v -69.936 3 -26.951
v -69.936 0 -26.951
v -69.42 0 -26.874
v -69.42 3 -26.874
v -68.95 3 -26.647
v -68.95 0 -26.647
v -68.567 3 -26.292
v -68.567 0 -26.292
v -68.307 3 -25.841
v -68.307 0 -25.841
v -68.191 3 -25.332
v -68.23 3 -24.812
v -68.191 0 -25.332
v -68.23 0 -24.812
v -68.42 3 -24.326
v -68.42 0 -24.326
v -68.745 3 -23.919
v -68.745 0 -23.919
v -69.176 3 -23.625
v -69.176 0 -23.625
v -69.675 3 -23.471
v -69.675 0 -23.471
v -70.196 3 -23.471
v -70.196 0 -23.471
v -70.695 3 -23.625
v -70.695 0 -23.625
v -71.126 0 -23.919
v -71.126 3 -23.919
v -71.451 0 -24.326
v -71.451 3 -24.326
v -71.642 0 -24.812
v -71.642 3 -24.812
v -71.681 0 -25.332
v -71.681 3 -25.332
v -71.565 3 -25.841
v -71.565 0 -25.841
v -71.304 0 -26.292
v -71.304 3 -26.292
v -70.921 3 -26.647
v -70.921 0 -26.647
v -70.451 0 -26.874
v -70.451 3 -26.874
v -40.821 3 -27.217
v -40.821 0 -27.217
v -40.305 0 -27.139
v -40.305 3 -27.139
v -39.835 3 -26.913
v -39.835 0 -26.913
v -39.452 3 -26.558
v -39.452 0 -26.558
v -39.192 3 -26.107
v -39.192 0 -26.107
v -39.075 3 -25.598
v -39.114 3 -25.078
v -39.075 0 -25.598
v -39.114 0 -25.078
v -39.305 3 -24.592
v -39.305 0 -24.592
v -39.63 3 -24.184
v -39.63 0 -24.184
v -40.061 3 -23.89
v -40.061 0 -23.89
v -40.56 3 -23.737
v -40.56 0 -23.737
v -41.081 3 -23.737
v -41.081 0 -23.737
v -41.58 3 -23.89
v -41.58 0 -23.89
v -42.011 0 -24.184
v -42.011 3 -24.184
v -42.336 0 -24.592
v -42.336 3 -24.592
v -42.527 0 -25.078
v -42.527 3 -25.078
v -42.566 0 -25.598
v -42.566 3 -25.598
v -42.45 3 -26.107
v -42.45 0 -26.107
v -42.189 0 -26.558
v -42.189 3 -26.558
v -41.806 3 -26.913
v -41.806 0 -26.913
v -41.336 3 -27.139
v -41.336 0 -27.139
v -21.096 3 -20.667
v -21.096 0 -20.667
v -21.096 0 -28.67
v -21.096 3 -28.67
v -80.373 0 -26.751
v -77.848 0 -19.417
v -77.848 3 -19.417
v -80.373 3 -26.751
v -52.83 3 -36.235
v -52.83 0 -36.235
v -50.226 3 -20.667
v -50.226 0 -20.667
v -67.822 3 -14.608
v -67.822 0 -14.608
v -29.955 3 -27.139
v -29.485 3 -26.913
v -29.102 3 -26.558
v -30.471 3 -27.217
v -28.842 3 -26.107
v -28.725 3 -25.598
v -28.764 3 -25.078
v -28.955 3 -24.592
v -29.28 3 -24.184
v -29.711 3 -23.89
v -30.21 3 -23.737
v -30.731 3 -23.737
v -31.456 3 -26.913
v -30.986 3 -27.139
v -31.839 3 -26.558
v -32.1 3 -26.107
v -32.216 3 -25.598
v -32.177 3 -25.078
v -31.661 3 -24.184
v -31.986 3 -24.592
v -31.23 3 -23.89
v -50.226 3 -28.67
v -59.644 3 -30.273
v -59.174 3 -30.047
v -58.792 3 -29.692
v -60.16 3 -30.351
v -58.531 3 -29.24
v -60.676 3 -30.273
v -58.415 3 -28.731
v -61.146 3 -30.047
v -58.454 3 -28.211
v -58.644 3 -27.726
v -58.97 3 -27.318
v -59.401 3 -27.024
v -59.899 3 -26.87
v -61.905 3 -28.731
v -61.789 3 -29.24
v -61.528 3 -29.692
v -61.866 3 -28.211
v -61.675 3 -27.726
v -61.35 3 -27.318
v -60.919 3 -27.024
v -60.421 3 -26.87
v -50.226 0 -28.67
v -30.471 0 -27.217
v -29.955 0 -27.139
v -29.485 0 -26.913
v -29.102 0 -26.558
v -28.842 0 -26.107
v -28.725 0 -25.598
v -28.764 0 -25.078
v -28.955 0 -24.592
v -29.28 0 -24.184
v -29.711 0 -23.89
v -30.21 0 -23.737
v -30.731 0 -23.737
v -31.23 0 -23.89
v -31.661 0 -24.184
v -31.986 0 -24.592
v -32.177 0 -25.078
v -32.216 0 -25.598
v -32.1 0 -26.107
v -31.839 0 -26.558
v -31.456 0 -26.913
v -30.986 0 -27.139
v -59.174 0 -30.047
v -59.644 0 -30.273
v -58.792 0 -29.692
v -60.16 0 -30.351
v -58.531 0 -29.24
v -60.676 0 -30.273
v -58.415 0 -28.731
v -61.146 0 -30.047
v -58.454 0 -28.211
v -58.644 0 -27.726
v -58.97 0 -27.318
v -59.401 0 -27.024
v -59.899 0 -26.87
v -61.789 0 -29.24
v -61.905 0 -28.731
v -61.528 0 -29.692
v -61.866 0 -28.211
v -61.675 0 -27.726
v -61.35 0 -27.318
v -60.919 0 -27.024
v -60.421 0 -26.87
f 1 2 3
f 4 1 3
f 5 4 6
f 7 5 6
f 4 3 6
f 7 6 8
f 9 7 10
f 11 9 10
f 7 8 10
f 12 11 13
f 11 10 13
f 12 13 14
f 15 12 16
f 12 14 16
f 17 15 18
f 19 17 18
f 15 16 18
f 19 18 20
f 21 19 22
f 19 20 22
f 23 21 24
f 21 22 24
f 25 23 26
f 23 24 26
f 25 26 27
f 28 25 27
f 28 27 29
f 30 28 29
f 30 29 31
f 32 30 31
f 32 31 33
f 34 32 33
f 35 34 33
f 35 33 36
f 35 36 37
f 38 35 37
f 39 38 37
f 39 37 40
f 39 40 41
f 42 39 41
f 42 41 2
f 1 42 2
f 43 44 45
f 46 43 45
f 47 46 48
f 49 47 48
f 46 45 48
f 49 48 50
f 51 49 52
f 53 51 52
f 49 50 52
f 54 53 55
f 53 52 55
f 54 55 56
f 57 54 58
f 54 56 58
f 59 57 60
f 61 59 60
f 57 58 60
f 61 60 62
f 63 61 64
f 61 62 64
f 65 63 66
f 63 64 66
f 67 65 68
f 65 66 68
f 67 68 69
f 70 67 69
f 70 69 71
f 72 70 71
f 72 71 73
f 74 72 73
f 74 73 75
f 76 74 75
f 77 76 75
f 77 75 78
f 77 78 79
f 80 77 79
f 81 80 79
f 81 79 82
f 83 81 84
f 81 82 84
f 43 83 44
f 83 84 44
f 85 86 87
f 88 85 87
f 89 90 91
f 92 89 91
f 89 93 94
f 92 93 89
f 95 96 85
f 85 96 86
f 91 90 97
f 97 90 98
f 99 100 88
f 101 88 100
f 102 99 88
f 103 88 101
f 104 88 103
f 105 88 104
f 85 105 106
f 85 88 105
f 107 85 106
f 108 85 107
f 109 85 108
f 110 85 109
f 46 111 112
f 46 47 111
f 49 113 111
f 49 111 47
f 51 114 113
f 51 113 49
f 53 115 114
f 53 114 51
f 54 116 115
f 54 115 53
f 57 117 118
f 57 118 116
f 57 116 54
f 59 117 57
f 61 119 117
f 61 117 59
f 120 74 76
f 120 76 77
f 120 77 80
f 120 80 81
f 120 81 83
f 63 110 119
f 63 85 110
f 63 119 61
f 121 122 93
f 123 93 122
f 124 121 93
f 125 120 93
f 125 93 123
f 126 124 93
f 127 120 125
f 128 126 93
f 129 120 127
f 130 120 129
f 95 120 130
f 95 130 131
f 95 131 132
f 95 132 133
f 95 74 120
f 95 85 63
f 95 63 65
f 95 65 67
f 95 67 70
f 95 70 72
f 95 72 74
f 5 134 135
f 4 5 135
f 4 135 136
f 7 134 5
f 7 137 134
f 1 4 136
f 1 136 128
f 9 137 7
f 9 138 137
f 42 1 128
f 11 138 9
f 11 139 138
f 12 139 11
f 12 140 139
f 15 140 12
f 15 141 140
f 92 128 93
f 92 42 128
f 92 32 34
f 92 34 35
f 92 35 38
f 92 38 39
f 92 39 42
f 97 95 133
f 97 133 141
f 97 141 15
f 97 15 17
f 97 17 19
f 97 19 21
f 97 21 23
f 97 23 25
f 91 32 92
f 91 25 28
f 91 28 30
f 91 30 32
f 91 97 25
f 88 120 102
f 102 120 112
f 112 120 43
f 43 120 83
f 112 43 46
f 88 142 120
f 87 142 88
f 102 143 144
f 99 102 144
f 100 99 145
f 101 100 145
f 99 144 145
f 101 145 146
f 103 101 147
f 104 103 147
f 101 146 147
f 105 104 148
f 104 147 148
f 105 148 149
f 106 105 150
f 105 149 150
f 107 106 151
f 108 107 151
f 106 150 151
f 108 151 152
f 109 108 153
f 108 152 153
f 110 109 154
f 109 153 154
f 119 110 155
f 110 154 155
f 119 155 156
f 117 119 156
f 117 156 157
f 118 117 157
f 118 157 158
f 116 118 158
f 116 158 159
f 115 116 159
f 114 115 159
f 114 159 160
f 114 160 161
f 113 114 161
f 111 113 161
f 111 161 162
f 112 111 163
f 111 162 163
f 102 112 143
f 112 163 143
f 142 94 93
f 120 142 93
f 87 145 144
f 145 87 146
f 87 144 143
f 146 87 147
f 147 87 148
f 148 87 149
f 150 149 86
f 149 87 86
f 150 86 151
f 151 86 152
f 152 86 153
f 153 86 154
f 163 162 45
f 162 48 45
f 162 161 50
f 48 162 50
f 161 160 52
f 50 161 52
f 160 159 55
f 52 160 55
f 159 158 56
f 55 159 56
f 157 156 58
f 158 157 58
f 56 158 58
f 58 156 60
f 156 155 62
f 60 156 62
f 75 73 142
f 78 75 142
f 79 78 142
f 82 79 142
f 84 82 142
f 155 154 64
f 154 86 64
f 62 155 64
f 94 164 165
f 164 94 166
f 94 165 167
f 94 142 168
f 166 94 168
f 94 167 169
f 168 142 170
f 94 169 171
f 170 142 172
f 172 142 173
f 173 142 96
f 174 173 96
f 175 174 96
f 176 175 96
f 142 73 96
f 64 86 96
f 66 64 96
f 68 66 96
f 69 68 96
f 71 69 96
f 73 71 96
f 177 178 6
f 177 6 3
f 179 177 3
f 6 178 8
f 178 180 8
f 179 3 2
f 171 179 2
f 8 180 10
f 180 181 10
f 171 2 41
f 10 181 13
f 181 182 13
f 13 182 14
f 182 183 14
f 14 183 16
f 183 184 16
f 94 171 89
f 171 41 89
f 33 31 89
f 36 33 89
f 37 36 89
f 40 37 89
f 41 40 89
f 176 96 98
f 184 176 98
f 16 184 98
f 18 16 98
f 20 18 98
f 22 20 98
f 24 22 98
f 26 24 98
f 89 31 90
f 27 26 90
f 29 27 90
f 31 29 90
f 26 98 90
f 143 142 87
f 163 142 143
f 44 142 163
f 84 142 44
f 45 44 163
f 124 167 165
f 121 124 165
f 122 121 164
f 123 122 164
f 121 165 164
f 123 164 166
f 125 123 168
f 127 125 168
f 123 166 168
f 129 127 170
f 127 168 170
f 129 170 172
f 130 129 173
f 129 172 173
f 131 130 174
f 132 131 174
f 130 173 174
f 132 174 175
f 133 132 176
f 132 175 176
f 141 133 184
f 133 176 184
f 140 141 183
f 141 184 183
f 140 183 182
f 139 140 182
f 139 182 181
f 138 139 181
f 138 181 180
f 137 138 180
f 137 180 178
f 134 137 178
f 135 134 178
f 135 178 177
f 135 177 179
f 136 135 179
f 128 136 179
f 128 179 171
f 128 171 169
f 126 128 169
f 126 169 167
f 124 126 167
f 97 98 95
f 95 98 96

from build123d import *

# Parameters (mm, degrees)
SKETCH2_W           = 29.13019228
SKETCH2_H           = 8.0032651
BOSS_EXTRUDE1_DEPTH = 3
SKETCH3_R           = 1.75
CUT_EXTRUDE1_DEPTH  = 3
SKETCH5_W           = 29.13
SKETCH5_H           = 3
BOSS_EXTRUDE2_DEPTH = 8
SKETCH6_R           = 1.75
CUT_EXTRUDE3_DEPTH  = 7
CUT_EXTRUDE4_DEPTH  = 5
CUT_EXTRUDE5_DEPTH  = 3
CUT_EXTRUDE7_DEPTH  = 10


with BuildPart() as part:
    # Sketch2 → Boss-Extrude1 (new body)
    with BuildSketch(Plane(origin=(0, 0, 0), x_dir=(1, 0, 0), z_dir=(0, 1, 0))):
        Polygon((-50.225743969, 28.670443259), (-77.768700077, 19.18664292), (-77.768700077, 11.18337782), (-50.225743969, 20.667178159), align=None)
        with Locations((-35.660647829, 24.668810709)):
            Rectangle(SKETCH2_W, SKETCH2_H)
    extrude(amount=BOSS_EXTRUDE1_DEPTH)

    # Sketch3 → Cut-Extrude1 (cut)
    with BuildSketch(Plane.XZ):
        with Locations(Location((-30.470551689, -25.467178146, 0), (0, 0, 270))):
            Circle(SKETCH3_R)
        with Locations(Location((-40.820551689, -25.467178146, 0), (0, 0, 270))):
            Circle(SKETCH3_R)
    extrude(amount=-CUT_EXTRUDE1_DEPTH, mode=Mode.SUBTRACT)

    # Sketch5 → Boss-Extrude2 (add)
    with BuildSketch(Plane(origin=(-14.149302504, 0, -41.092558245), x_dir=(-0.9455185755993176, 0, 0.32556815445715426), z_dir=(-0.32556815445715426, 0, -0.9455185755993176))):
        with Locations((52.720190597, 1.5)):
            Rectangle(SKETCH5_W, SKETCH5_H)
    extrude(amount=BOSS_EXTRUDE2_DEPTH)

    # Sketch6 → Cut-Extrude3 (cut)
    with BuildSketch(Plane.XZ):
        with Locations(Location((-69.935655683, -25.201370089, 0), (0, 0, 270))):
            Circle(SKETCH6_R)
        with Locations(Location((-60.159815933, -28.600701946, 0), (0, 0, 270))):
            Circle(SKETCH6_R)
    extrude(amount=-CUT_EXTRUDE3_DEPTH, mode=Mode.SUBTRACT)

    # Sketch7 → Cut-Extrude4 (cut)
    with BuildSketch(Plane.XZ):
        Polygon((-77.768700077, -19.18664292), (-75.305049077, -12.031680889), (-77.768700077, -11.18337782), align=None)
    extrude(amount=-CUT_EXTRUDE4_DEPTH, mode=Mode.SUBTRACT)

    # Sketch9 → Cut-Extrude5 (cut)
    with BuildSketch(Plane.XZ):
        with BuildLine():
            Line((-75.305049077, -12.031680889), (-77.847985202, -19.416903645))
            add(Edge.make_bspline(
                [(-69.0352228, -14.190555206), (-74.086749011, -15.68616926), (-77.847985202, -19.416903645)],
                knots=[0, 0, 0, 1, 1, 1], degree=2))
            Line((-69.0352228, -14.190555206), (-75.305049077, -12.031680889))
        make_face()
    extrude(amount=-CUT_EXTRUDE5_DEPTH, mode=Mode.SUBTRACT)

    # Sketch10 → Cut-Extrude7 (cut)
    with BuildSketch(Plane.XZ):
        with BuildLine():
            Line((-75.305049077, -12.031680889), (-77.847985202, -19.416903645))
            add(Edge.make_bspline(
                [(-69.0352228, -14.190555206), (-74.086749011, -15.68616926), (-77.847985202, -19.416903645)],
                knots=[0, 0, 0, 1, 1, 1], degree=2))
            Line((-69.0352228, -14.190555206), (-75.305049077, -12.031680889))
        make_face()
        with BuildLine():
            add(Edge.make_bspline(
                [(-69.0352228, -14.190555206), (-74.086749011, -15.68616926), (-77.847985202, -19.416903645)],
                knots=[0, 0, 0, 1, 1, 1], degree=2))
            Line((-77.847985202, -19.416903645), (-67.8223159, -14.608192544))
            Line((-67.8223159, -14.608192544), (-69.0352228, -14.190555206))
        make_face()
    extrude(amount=-CUT_EXTRUDE7_DEPTH, mode=Mode.SUBTRACT)


solid = part.part
